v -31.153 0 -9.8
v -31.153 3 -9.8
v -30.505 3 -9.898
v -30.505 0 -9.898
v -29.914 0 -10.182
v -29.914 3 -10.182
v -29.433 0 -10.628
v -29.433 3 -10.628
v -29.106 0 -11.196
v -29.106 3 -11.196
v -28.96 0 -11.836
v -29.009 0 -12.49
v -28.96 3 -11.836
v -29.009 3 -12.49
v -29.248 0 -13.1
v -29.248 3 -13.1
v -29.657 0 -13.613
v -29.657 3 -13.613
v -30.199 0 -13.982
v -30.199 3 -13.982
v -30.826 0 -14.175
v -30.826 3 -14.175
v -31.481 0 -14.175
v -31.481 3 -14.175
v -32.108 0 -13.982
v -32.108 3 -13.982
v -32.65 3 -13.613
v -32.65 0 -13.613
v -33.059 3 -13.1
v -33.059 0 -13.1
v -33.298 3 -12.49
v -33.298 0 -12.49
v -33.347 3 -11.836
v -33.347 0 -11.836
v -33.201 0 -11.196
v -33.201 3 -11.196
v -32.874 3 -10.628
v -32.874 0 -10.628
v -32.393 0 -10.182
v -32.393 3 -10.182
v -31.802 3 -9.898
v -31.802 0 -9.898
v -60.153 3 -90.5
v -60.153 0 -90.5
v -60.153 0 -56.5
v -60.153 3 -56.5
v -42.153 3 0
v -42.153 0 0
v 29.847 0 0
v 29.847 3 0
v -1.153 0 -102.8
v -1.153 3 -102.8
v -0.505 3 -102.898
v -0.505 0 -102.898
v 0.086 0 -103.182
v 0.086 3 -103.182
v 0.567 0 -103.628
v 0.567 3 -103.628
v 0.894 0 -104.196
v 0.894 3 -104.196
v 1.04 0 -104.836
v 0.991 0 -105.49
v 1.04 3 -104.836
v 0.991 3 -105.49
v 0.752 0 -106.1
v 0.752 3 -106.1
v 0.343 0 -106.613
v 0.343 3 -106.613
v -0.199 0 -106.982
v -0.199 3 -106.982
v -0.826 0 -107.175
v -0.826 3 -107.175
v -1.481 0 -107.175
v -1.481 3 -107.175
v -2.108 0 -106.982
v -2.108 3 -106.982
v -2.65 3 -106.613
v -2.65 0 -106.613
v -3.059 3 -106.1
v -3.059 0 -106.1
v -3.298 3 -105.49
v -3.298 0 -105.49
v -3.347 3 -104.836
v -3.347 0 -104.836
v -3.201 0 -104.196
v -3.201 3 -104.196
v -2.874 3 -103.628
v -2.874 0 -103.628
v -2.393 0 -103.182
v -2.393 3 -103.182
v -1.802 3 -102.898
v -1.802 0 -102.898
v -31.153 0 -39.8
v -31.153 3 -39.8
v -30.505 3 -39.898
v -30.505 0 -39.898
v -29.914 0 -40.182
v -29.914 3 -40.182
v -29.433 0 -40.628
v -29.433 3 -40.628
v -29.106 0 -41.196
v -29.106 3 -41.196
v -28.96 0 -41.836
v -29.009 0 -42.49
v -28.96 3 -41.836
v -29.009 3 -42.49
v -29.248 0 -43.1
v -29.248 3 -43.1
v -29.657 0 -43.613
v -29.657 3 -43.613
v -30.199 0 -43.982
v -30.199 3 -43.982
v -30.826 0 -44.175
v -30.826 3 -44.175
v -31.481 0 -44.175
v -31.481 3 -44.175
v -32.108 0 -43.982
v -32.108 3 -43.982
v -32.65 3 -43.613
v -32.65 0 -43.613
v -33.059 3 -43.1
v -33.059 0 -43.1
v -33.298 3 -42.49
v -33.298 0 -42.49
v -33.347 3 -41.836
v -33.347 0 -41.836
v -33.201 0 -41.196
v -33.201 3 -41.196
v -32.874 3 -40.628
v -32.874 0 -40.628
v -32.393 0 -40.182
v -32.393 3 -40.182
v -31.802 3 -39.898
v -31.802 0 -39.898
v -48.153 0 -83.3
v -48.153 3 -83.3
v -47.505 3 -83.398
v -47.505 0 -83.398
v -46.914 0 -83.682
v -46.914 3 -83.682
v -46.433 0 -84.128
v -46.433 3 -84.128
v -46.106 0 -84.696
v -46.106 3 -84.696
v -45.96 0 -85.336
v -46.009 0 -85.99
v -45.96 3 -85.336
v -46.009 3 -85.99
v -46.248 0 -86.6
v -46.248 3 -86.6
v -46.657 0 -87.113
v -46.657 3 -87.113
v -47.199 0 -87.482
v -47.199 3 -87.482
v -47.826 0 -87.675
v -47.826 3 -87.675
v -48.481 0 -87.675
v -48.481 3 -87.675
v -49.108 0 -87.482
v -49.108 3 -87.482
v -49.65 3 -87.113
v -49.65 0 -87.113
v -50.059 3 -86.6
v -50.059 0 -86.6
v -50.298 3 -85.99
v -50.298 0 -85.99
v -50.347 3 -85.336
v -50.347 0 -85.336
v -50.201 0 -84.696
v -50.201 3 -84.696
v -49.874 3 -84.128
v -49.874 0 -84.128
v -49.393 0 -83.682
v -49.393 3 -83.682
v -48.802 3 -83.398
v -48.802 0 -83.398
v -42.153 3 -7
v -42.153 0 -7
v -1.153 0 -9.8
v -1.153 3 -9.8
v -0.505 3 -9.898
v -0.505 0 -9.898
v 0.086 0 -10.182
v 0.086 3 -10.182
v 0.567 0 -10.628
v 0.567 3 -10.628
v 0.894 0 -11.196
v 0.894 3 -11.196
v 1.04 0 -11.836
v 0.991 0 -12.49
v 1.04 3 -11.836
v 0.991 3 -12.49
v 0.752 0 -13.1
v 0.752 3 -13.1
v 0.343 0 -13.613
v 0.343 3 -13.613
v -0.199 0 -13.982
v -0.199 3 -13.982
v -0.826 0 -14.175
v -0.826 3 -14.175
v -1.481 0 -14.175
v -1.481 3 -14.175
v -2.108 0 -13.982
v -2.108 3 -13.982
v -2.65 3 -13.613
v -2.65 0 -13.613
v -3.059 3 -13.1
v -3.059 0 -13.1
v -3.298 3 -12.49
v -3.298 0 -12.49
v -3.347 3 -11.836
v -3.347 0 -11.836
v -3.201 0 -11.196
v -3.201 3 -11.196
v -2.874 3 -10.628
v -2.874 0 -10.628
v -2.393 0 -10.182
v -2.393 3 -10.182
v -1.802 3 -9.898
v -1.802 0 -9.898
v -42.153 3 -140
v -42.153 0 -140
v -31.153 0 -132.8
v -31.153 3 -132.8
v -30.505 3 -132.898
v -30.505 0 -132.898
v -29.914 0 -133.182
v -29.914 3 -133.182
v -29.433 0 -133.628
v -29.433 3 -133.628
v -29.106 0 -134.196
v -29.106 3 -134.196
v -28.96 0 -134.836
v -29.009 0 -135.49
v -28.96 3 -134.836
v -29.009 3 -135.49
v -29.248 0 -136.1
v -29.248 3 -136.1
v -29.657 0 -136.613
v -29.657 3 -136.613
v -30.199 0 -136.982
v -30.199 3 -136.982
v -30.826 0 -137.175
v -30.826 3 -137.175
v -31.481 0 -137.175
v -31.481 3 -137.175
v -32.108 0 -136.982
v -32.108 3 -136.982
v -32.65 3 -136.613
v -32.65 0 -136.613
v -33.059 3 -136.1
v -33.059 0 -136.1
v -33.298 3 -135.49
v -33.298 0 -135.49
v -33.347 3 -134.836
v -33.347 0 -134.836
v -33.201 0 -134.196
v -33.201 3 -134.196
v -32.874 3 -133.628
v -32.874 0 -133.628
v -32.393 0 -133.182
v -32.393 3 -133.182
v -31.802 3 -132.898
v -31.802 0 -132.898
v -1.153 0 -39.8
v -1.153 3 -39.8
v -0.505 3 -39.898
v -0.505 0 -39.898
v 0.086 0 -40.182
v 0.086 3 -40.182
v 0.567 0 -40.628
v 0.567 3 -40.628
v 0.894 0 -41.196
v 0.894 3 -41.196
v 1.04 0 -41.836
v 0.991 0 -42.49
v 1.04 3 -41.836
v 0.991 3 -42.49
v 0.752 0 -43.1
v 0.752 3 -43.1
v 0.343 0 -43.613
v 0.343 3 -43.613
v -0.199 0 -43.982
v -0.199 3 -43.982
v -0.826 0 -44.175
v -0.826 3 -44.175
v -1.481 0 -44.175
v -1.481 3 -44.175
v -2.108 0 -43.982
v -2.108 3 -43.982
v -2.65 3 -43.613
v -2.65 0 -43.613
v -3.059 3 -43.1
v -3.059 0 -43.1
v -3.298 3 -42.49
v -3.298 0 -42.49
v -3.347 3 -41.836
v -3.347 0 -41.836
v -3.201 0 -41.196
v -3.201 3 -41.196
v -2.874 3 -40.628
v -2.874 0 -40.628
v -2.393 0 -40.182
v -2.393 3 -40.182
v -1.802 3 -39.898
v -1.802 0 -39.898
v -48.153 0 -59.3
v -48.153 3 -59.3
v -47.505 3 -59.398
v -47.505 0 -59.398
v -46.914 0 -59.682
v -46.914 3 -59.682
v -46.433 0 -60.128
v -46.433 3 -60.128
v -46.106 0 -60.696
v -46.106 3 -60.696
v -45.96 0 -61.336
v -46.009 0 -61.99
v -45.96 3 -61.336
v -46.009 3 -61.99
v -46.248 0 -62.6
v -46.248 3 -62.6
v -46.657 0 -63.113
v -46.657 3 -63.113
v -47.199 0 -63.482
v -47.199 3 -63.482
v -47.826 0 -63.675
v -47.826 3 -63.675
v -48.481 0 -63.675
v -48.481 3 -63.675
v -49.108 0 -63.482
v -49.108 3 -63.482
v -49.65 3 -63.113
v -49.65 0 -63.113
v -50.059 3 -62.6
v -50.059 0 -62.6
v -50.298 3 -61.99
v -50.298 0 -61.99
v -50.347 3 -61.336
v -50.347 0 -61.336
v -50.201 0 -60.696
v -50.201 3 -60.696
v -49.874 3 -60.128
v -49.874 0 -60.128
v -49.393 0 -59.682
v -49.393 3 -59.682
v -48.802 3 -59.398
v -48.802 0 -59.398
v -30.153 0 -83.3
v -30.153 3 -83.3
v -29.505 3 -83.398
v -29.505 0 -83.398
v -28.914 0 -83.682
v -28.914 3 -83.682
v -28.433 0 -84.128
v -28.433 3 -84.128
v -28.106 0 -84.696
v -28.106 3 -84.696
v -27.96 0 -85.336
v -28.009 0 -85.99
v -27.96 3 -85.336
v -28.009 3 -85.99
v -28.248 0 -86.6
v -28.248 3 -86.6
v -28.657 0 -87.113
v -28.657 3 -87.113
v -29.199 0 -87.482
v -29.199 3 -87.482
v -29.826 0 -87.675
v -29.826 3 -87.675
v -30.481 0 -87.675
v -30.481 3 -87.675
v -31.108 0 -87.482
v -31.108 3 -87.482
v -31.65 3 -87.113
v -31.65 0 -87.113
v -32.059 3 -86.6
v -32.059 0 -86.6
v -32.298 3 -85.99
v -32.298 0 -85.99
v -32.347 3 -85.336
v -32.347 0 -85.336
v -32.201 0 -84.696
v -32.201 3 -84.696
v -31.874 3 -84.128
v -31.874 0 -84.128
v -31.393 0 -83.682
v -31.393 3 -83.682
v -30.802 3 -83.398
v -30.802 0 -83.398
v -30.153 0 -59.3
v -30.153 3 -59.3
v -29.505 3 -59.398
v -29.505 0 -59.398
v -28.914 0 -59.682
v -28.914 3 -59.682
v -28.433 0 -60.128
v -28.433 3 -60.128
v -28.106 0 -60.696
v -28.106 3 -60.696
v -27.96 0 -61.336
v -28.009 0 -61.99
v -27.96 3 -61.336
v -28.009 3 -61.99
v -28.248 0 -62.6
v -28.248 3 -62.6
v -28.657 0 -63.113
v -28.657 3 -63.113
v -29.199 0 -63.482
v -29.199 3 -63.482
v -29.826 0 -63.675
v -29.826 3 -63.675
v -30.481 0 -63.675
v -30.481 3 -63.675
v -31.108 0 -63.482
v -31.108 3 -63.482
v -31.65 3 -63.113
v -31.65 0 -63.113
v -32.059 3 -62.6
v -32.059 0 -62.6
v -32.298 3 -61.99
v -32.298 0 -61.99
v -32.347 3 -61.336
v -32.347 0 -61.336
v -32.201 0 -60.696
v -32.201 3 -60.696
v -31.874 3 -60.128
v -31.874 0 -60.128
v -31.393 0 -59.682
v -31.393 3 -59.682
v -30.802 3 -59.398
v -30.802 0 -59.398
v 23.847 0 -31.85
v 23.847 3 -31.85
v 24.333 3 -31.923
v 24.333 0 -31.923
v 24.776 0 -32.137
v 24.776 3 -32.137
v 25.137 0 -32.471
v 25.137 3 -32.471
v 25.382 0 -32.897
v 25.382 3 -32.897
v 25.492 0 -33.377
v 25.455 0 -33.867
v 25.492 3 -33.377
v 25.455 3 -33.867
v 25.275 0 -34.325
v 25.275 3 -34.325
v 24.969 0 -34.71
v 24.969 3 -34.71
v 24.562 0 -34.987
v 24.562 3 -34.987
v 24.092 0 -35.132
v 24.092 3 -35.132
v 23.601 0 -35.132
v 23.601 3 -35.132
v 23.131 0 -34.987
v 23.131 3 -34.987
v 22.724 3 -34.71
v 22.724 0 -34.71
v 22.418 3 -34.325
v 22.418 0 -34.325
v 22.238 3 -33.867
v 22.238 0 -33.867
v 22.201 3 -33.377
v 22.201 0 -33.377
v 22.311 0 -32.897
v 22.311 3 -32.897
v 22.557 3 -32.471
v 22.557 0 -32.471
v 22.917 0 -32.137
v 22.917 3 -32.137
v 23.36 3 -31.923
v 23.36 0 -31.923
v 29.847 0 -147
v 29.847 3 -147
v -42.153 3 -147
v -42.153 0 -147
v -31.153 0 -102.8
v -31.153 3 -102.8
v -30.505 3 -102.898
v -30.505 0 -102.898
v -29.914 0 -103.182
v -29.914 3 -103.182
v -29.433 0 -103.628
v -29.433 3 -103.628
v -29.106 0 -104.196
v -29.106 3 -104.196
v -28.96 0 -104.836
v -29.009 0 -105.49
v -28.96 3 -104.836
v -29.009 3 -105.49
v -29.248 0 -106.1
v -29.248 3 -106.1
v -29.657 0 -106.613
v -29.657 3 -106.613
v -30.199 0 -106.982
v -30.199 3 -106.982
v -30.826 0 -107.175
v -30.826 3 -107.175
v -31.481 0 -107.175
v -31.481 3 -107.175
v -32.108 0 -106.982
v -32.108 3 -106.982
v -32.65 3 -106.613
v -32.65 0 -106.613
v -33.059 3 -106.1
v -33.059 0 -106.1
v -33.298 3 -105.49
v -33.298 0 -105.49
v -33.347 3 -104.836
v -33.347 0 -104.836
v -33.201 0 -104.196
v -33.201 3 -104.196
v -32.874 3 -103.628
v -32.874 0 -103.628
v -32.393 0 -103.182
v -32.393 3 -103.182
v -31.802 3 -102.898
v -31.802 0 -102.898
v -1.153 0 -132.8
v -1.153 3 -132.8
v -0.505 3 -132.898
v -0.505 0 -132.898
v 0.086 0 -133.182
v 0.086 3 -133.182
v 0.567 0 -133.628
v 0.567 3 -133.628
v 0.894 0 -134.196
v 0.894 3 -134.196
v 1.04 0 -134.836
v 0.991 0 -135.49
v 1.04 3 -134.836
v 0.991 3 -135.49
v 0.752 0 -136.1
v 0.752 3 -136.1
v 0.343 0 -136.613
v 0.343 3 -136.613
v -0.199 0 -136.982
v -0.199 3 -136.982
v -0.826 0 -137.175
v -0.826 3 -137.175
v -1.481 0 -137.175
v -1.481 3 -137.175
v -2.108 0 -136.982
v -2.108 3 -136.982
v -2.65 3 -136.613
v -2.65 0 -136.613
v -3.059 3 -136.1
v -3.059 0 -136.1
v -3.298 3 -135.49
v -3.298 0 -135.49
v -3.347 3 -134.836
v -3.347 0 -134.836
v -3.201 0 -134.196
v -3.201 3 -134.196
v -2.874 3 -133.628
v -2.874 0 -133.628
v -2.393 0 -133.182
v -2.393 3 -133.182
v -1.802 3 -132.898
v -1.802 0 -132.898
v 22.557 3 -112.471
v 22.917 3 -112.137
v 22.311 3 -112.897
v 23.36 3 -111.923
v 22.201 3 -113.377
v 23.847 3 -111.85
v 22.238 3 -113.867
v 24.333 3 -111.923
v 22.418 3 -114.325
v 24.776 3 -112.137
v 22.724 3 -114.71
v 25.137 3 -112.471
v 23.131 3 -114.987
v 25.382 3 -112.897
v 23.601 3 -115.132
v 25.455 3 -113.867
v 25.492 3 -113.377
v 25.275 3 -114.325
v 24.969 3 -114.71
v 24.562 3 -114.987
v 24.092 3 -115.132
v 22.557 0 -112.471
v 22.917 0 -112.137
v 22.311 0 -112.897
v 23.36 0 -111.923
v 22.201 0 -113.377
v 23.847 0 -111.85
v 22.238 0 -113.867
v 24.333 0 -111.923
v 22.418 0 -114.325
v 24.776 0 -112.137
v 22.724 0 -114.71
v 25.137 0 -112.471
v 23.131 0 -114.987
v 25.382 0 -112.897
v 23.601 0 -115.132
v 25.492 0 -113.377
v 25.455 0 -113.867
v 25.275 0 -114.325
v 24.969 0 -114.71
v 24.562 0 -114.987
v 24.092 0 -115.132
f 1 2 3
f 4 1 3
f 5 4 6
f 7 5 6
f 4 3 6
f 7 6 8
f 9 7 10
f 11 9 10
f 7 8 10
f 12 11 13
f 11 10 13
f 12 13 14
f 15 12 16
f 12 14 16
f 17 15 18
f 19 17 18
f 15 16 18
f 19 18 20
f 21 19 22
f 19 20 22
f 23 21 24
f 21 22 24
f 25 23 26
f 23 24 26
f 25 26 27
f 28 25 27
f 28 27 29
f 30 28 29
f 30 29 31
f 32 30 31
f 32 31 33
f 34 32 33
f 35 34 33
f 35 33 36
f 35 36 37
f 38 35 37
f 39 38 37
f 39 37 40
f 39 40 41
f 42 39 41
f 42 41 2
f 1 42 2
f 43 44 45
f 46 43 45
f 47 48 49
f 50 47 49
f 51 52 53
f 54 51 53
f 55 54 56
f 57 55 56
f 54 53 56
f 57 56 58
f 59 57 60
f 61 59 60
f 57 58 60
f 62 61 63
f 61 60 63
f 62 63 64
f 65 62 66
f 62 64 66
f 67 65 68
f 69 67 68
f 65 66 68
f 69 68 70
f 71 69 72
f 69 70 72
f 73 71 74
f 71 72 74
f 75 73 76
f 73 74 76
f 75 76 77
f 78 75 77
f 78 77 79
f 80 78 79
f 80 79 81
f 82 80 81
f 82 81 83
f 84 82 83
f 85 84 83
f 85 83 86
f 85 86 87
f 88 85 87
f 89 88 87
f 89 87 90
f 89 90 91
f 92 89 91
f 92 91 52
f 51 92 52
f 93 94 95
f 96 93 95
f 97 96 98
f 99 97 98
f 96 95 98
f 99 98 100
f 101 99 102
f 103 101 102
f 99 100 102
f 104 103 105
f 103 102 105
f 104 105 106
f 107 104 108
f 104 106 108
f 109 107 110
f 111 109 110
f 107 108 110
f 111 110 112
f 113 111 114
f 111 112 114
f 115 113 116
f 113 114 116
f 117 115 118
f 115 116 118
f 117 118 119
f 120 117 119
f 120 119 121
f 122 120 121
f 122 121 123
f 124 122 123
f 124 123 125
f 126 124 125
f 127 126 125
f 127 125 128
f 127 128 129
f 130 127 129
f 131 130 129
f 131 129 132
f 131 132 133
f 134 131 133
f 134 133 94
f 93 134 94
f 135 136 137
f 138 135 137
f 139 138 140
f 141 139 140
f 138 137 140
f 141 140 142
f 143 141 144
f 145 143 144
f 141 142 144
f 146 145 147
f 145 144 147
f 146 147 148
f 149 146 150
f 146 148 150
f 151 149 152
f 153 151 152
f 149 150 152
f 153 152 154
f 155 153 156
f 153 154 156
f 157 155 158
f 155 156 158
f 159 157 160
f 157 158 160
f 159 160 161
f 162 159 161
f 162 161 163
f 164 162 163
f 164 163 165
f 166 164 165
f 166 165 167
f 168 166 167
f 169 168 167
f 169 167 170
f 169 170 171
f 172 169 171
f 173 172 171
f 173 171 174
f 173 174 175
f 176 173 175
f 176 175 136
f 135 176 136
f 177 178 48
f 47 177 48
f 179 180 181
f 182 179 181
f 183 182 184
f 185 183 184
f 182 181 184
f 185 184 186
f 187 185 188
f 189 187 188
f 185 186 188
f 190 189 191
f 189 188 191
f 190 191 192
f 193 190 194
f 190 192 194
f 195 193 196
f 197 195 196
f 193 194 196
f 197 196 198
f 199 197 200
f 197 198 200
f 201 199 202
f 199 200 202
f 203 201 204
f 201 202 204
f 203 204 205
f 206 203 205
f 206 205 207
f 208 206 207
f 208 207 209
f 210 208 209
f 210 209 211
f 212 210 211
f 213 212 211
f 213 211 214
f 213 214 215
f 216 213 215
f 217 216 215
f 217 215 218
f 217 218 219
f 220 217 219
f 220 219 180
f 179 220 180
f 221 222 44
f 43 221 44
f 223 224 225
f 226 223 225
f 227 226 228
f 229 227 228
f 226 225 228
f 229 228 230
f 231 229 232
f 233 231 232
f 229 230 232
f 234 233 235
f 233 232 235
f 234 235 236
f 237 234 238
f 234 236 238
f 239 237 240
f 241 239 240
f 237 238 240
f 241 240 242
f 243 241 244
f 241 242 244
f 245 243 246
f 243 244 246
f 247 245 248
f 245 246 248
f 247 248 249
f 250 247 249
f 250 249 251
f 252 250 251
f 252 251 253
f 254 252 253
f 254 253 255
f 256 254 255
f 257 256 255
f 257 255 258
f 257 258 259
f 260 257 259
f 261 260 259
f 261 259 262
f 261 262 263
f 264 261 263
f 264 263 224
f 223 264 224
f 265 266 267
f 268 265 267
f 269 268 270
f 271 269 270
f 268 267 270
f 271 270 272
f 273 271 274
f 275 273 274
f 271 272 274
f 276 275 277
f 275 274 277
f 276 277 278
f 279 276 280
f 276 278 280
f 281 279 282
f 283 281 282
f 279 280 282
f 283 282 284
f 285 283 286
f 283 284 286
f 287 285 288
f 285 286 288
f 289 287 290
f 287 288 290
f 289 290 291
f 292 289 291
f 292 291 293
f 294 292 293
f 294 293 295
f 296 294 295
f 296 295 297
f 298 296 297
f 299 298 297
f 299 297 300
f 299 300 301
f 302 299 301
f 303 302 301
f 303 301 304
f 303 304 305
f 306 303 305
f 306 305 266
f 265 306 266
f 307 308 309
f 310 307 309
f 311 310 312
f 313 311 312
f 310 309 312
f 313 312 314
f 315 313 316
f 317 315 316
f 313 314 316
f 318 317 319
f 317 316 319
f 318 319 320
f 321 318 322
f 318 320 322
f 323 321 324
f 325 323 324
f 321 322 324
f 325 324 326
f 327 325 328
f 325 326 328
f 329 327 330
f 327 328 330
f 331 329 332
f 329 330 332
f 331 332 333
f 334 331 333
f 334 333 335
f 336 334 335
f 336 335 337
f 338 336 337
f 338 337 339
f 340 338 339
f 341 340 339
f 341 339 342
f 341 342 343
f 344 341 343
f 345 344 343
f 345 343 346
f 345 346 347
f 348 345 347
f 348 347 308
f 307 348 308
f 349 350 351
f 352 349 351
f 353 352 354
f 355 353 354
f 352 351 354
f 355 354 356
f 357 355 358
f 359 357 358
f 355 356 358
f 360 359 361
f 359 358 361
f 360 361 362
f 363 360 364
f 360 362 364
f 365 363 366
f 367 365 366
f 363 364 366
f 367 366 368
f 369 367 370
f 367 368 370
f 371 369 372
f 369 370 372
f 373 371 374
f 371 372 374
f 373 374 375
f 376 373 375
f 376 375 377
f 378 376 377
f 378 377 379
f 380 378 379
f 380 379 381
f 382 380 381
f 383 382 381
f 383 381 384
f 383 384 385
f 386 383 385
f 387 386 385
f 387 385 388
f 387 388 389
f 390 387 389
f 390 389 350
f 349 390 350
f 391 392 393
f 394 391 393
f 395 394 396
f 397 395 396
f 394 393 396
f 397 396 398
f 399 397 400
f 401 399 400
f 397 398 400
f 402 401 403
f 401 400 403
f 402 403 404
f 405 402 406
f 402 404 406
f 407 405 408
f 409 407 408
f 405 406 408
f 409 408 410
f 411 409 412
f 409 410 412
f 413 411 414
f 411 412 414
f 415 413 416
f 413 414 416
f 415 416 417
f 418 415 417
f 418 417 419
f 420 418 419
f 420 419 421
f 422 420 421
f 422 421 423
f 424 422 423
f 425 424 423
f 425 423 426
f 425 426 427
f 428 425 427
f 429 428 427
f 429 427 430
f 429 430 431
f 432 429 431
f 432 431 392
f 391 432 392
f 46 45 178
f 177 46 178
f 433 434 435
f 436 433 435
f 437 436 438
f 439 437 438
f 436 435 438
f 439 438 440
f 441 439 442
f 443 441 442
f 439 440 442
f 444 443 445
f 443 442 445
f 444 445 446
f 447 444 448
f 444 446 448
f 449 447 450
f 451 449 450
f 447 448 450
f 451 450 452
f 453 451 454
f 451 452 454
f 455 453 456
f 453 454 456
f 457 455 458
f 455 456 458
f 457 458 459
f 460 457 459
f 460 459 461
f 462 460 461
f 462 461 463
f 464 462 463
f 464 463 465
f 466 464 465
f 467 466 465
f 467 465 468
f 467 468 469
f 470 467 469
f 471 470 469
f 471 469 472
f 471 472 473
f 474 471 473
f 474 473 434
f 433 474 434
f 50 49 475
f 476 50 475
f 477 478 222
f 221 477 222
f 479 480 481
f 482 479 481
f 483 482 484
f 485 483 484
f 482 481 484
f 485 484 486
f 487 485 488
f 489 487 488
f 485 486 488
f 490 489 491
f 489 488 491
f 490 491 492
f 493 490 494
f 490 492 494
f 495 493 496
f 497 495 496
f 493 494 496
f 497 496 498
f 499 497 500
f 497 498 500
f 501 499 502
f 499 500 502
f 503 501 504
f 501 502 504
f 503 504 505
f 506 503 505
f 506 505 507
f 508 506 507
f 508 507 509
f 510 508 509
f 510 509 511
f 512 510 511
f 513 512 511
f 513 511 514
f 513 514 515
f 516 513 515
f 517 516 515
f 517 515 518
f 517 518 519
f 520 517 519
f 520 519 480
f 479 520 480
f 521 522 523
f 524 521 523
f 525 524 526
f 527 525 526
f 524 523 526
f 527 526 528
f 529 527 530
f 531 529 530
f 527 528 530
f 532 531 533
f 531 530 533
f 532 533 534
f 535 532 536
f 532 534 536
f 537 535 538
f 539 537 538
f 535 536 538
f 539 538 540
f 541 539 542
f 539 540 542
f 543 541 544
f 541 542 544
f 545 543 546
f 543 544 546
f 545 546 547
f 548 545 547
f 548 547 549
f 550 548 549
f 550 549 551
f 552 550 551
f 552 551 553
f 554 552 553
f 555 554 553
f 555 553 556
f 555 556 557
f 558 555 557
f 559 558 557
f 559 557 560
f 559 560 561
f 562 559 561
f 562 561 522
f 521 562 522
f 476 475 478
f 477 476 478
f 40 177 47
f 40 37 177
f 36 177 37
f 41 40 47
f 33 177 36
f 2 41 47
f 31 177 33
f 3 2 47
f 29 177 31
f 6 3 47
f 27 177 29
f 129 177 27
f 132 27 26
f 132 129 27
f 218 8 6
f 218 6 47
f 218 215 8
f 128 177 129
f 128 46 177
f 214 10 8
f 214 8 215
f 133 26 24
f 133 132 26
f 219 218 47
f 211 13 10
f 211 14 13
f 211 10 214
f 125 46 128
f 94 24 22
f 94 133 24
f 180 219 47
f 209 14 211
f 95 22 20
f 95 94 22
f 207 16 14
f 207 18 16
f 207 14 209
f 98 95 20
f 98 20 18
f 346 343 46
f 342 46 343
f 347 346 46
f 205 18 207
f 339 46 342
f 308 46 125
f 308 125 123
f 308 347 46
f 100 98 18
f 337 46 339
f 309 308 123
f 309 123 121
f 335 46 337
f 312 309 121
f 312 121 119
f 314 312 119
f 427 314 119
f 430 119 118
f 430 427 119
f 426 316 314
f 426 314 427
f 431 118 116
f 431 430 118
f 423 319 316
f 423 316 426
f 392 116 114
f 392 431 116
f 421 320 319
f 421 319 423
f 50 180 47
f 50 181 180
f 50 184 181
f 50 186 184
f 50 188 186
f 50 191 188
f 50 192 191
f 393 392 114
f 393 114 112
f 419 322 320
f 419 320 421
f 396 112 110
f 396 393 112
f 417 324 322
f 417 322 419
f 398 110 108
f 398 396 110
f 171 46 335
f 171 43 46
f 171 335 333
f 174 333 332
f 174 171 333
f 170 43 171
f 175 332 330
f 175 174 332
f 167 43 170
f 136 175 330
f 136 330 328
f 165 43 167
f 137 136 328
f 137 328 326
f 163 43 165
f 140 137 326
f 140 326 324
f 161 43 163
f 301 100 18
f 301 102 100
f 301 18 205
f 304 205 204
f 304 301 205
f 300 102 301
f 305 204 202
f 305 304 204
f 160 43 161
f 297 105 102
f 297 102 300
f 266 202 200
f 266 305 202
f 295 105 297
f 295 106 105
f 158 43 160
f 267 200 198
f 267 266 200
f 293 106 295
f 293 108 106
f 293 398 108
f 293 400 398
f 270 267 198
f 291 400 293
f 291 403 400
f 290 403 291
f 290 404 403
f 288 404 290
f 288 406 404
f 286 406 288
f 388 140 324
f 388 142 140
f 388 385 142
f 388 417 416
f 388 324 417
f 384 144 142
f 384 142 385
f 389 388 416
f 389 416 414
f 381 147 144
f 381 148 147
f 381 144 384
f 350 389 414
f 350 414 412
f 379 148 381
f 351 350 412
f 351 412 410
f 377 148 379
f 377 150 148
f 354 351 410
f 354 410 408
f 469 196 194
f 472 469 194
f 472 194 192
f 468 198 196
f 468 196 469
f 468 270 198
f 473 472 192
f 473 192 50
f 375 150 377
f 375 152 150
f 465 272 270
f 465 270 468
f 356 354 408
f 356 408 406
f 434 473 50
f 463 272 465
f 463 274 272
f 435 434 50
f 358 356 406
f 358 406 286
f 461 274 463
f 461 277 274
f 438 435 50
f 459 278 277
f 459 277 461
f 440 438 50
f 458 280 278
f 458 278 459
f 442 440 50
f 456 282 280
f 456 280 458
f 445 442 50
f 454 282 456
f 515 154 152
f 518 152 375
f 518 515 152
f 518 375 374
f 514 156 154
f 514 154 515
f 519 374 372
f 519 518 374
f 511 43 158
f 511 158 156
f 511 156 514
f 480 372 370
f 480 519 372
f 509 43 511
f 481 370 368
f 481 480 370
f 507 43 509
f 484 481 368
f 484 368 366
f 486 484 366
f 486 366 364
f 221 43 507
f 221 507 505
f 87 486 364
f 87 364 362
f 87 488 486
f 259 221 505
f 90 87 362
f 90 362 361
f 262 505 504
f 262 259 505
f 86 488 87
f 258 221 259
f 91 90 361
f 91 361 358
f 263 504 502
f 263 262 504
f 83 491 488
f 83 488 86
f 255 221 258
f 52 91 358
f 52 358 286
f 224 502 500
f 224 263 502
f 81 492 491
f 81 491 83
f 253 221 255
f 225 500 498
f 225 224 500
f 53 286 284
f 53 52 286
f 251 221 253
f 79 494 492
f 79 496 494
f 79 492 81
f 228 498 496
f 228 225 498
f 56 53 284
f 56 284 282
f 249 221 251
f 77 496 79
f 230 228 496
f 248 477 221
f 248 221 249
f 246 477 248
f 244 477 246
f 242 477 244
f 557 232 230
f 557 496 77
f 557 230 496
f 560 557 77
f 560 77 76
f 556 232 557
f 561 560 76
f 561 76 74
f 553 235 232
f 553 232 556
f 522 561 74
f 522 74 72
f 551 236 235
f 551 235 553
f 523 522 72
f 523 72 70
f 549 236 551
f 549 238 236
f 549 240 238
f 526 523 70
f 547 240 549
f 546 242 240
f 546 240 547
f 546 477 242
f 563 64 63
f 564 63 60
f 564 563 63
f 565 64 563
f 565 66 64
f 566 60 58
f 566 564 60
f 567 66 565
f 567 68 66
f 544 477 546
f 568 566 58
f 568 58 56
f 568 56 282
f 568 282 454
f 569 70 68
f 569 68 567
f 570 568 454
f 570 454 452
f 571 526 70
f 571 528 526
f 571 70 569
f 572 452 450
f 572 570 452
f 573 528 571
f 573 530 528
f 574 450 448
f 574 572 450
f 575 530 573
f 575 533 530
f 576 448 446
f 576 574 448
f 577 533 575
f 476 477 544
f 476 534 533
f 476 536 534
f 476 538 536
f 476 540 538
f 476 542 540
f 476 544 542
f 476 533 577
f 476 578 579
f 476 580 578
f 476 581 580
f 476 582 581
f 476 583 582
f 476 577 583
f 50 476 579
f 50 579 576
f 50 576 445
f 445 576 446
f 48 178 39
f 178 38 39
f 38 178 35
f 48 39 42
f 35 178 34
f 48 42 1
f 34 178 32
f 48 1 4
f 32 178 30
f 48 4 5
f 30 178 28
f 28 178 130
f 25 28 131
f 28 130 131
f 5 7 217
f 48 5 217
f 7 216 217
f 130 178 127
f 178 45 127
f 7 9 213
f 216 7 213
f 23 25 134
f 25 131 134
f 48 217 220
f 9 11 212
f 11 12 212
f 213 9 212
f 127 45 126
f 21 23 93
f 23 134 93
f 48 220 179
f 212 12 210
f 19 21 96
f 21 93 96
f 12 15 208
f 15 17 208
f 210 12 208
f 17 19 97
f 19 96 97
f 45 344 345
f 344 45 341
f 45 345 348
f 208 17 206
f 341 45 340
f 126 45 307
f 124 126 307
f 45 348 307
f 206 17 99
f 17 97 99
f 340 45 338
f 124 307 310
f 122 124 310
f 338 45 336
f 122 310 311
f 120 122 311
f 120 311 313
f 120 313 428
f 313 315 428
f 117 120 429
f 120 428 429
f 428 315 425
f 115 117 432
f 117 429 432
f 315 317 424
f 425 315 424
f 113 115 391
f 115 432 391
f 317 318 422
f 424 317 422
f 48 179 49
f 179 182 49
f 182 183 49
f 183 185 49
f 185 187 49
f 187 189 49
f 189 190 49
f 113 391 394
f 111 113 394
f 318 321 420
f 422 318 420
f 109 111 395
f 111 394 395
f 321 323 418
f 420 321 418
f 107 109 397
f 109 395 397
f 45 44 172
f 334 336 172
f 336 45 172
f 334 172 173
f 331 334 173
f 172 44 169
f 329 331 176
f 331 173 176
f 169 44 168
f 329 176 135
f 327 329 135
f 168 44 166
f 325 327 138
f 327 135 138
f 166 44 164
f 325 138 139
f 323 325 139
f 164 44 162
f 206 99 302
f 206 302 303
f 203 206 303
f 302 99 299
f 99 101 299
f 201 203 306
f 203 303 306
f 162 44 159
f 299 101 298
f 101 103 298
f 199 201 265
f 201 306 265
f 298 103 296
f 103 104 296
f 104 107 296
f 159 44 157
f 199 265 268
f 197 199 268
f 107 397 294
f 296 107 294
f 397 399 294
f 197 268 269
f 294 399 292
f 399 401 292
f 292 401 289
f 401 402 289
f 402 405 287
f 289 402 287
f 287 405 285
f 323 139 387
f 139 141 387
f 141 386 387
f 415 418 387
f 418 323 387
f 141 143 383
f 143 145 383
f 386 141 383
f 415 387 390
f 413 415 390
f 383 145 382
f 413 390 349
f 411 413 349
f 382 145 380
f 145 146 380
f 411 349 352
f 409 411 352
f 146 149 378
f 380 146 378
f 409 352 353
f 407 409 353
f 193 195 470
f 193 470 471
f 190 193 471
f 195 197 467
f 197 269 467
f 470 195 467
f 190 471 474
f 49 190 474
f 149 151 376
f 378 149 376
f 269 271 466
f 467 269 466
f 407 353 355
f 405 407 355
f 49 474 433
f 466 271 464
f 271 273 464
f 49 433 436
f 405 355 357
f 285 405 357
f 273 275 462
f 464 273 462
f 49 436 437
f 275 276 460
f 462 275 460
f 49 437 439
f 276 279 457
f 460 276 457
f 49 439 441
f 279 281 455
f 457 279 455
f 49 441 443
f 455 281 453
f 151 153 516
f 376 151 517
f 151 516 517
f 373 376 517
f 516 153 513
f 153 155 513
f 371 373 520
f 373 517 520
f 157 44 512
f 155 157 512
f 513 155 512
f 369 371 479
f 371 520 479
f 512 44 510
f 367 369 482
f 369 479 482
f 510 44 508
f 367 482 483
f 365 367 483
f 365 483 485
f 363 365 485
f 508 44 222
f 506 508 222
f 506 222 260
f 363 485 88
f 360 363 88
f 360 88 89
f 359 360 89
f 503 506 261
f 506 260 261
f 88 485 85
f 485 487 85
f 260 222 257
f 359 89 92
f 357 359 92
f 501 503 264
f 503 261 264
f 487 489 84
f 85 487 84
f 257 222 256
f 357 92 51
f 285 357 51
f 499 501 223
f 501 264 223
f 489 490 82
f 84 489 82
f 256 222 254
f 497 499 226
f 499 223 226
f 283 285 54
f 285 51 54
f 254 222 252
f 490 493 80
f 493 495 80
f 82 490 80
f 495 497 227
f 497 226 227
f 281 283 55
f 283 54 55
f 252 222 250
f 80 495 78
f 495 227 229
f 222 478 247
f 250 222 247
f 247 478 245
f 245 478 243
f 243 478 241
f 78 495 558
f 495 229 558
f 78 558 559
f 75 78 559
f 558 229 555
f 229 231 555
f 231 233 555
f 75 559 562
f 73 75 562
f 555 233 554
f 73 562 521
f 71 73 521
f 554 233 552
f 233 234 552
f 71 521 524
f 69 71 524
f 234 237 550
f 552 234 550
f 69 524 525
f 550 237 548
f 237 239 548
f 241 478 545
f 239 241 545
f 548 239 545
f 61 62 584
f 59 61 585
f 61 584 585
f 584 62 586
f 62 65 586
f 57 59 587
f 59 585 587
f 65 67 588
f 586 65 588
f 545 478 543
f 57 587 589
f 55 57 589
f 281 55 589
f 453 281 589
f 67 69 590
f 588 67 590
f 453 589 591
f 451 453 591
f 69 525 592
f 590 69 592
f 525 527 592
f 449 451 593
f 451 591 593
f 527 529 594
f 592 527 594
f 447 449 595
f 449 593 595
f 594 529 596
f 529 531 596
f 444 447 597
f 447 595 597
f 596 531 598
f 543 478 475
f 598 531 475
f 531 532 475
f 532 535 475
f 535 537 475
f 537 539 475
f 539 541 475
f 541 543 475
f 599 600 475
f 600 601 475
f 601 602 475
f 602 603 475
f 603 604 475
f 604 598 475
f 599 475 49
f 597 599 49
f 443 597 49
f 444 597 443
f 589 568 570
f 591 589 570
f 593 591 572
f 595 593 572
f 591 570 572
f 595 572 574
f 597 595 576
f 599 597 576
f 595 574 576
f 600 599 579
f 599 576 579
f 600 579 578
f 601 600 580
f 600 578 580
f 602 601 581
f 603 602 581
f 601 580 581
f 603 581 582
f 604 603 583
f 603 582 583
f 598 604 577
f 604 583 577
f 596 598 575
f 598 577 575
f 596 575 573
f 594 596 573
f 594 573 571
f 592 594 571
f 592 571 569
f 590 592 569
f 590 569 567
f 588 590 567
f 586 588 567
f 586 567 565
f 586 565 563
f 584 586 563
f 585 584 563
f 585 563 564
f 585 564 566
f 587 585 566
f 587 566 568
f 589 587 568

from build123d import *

# Parameters (mm, degrees)
EXTRUDE_1_DEPTH     = 3
SKETCH_2_R          = 2.2
SKETCH_2_R_2        = 1.65
CUT_EXTRUDE_1_DEPTH = 10


with BuildPart() as part:
    # 草图1 → 凸台-拉伸1 (new body)
    with BuildSketch(Plane(origin=(0, 0, 0), x_dir=(1, 0, 0), z_dir=(0, 1, 0))):
        Polygon((0, 0), (29.84652885, 0), (29.84652885, 147), (0, 147), (-42.15347115, 147), (-42.15347115, 140), (-60.15347115, 90.5), (-60.15347115, 56.5), (-42.15347115, 7), (-42.15347115, 0), align=None)
    extrude(amount=EXTRUDE_1_DEPTH)

    # 草图2 → 切除-拉伸1 (cut)
    with BuildSketch(Plane(origin=(0, 3, 0), x_dir=(1, 0, 0), z_dir=(0, 1, 0))):
        with Locations(Location((-48.15347115, 85.5, 0), (0, 0, 270))):
            Circle(SKETCH_2_R)
        with Locations(Location((-30.15347115, 85.5, 0), (0, 0, 270))):
            Circle(SKETCH_2_R)
        with Locations(Location((-30.15347115, 61.5, 0), (0, 0, 270))):
            Circle(SKETCH_2_R)
        with Locations(Location((-48.15347115, 61.5, 0), (0, 0, 270))):
            Circle(SKETCH_2_R)
        with Locations(Location((-1.15347115, 135, 0), (0, 0, 270))):
            Circle(SKETCH_2_R)
        with Locations(Location((-1.15347115, 105, 0), (0, 0, 270))):
            Circle(SKETCH_2_R)
        with Locations(Location((-31.15347115, 135, 0), (0, 0, 270))):
            Circle(SKETCH_2_R)
        with Locations(Location((-31.15347115, 105, 0), (0, 0, 270))):
            Circle(SKETCH_2_R)
        with Locations(Location((-31.15347115, 42, 0), (0, 0, 270))):
            Circle(SKETCH_2_R)
        with Locations(Location((-31.15347115, 12, 0), (0, 0, 270))):
            Circle(SKETCH_2_R)
        with Locations(Location((-1.15347115, 42, 0), (0, 0, 270))):
            Circle(SKETCH_2_R)
        with Locations(Location((-1.15347115, 12, 0), (0, 0, 270))):
            Circle(SKETCH_2_R)
        with Locations(Location((23.84652885, 113.5, 0), (0, 0, 270))):
            Circle(SKETCH_2_R_2)
        with Locations(Location((23.84652885, 33.5, 0), (0, 0, 270))):
            Circle(SKETCH_2_R_2)
    extrude(amount=-CUT_EXTRUDE_1_DEPTH, mode=Mode.SUBTRACT)


solid = part.part
